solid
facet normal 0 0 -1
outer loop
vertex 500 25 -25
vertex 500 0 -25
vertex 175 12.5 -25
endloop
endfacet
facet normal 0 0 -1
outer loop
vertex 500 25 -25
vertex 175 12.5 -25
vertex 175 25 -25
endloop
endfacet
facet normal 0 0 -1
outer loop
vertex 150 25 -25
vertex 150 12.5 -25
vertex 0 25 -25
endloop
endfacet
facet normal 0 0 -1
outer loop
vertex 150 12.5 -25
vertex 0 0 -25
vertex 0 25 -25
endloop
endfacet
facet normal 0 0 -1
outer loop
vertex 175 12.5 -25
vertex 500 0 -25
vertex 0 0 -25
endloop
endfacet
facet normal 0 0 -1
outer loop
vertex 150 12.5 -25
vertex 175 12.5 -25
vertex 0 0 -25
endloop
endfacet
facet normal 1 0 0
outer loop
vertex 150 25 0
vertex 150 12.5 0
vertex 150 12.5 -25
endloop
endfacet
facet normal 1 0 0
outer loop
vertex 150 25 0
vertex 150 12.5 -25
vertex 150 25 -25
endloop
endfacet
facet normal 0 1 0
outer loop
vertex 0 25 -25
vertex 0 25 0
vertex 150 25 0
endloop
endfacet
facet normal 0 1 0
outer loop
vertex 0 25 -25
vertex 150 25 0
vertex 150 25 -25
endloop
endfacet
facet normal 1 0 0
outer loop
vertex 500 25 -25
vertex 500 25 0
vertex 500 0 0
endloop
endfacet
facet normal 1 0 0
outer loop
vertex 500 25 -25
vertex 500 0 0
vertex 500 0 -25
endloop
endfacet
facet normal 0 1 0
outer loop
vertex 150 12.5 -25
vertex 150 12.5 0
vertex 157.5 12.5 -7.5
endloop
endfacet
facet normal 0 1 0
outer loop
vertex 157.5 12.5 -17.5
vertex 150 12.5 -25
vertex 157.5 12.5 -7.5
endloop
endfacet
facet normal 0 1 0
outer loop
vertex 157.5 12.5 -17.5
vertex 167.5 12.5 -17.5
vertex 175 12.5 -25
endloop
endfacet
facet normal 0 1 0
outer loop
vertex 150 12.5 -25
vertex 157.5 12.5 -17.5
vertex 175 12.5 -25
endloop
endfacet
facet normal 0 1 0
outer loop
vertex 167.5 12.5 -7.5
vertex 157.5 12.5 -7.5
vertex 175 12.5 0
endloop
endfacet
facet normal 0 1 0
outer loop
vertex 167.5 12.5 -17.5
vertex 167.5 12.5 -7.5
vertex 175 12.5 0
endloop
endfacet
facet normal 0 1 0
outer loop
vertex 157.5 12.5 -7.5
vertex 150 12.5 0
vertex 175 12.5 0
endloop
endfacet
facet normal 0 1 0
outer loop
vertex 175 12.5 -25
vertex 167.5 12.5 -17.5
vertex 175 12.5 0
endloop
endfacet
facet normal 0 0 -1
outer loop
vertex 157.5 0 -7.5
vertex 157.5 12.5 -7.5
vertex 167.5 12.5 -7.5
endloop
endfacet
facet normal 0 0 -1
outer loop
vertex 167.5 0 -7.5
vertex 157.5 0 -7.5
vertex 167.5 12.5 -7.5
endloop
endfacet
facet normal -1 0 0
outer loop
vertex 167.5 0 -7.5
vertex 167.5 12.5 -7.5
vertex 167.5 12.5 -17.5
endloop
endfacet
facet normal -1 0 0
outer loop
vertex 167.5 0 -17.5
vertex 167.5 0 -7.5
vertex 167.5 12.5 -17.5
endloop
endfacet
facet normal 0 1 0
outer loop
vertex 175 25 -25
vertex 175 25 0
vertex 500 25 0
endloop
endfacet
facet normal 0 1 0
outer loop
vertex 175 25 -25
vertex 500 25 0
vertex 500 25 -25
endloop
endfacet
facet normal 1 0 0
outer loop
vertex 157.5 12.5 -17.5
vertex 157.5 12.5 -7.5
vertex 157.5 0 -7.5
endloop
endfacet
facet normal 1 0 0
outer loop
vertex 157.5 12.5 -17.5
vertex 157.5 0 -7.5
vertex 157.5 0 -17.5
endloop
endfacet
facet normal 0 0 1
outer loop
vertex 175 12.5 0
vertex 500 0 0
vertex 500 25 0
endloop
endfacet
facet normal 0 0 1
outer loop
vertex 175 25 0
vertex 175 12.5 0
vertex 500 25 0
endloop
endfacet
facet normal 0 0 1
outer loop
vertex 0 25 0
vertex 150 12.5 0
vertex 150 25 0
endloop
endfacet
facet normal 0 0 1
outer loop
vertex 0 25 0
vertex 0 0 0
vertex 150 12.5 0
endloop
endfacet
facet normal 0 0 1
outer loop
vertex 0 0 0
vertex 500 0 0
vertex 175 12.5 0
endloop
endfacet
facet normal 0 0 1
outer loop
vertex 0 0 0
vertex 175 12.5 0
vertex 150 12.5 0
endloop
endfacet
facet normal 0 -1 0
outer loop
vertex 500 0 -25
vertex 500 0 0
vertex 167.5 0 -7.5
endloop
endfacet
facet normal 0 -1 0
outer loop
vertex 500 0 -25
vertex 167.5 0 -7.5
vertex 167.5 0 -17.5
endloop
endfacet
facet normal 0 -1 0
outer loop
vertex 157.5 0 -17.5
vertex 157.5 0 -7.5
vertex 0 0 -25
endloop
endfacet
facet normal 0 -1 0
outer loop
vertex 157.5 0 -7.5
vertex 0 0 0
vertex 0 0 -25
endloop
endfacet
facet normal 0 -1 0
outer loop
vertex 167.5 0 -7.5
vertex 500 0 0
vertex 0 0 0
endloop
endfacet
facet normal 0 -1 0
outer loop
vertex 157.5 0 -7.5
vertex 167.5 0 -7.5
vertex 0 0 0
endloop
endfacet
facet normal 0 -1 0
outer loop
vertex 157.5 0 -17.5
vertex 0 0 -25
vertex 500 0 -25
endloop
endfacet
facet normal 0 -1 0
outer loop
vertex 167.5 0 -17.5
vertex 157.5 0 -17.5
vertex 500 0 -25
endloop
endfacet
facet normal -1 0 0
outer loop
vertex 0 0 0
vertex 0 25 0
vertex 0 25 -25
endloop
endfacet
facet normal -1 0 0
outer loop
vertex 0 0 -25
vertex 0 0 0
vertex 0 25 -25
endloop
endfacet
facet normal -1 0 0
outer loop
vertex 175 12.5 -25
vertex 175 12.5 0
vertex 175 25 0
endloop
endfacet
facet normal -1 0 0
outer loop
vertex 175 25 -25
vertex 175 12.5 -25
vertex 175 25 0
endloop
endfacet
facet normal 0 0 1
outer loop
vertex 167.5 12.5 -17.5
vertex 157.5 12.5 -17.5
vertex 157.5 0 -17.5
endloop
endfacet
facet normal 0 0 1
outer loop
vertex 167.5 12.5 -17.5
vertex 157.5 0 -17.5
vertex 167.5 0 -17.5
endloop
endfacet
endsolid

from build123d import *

# Parameters (mm, degrees)
SKETCH1_W           = 25
SKETCH1_H           = 25
BOSS_EXTRUDE1_DEPTH = 500
SKETCH2_W           = 25
SKETCH2_H           = 12.5
CUT_EXTRUDE1_DEPTH  = 502.248441394
SKETCH3_W           = 10
SKETCH3_H           = 10
CUT_EXTRUDE2_DEPTH  = 501.7806406


with BuildPart() as part:
    # Sketch1 → Boss-Extrude1 (new body)
    with BuildSketch(Plane(origin=(0, 0, 0), x_dir=(0, 0, -1), z_dir=(1, 0, 0))):
        with Locations((12.5, 12.5)):
            Rectangle(SKETCH1_W, SKETCH1_H)
    extrude(amount=BOSS_EXTRUDE1_DEPTH)

    # Sketch2 → Cut-Extrude1 (cut, through all)
    with BuildSketch(Plane.XY):
        with Locations((162.5, 18.75)):
            Rectangle(SKETCH2_W, SKETCH2_H)
    extrude(amount=-CUT_EXTRUDE1_DEPTH, mode=Mode.SUBTRACT)

    # Sketch3 → Cut-Extrude2 (cut, through all)
    with BuildSketch(Plane(origin=(0, 12.5, 0), x_dir=(1, 0, 0), z_dir=(0, 1, 0))):
        with Locations((162.5, 12.5)):
            Rectangle(SKETCH3_W, SKETCH3_H)
    extrude(amount=-CUT_EXTRUDE2_DEPTH, mode=Mode.SUBTRACT)


solid = part.part
